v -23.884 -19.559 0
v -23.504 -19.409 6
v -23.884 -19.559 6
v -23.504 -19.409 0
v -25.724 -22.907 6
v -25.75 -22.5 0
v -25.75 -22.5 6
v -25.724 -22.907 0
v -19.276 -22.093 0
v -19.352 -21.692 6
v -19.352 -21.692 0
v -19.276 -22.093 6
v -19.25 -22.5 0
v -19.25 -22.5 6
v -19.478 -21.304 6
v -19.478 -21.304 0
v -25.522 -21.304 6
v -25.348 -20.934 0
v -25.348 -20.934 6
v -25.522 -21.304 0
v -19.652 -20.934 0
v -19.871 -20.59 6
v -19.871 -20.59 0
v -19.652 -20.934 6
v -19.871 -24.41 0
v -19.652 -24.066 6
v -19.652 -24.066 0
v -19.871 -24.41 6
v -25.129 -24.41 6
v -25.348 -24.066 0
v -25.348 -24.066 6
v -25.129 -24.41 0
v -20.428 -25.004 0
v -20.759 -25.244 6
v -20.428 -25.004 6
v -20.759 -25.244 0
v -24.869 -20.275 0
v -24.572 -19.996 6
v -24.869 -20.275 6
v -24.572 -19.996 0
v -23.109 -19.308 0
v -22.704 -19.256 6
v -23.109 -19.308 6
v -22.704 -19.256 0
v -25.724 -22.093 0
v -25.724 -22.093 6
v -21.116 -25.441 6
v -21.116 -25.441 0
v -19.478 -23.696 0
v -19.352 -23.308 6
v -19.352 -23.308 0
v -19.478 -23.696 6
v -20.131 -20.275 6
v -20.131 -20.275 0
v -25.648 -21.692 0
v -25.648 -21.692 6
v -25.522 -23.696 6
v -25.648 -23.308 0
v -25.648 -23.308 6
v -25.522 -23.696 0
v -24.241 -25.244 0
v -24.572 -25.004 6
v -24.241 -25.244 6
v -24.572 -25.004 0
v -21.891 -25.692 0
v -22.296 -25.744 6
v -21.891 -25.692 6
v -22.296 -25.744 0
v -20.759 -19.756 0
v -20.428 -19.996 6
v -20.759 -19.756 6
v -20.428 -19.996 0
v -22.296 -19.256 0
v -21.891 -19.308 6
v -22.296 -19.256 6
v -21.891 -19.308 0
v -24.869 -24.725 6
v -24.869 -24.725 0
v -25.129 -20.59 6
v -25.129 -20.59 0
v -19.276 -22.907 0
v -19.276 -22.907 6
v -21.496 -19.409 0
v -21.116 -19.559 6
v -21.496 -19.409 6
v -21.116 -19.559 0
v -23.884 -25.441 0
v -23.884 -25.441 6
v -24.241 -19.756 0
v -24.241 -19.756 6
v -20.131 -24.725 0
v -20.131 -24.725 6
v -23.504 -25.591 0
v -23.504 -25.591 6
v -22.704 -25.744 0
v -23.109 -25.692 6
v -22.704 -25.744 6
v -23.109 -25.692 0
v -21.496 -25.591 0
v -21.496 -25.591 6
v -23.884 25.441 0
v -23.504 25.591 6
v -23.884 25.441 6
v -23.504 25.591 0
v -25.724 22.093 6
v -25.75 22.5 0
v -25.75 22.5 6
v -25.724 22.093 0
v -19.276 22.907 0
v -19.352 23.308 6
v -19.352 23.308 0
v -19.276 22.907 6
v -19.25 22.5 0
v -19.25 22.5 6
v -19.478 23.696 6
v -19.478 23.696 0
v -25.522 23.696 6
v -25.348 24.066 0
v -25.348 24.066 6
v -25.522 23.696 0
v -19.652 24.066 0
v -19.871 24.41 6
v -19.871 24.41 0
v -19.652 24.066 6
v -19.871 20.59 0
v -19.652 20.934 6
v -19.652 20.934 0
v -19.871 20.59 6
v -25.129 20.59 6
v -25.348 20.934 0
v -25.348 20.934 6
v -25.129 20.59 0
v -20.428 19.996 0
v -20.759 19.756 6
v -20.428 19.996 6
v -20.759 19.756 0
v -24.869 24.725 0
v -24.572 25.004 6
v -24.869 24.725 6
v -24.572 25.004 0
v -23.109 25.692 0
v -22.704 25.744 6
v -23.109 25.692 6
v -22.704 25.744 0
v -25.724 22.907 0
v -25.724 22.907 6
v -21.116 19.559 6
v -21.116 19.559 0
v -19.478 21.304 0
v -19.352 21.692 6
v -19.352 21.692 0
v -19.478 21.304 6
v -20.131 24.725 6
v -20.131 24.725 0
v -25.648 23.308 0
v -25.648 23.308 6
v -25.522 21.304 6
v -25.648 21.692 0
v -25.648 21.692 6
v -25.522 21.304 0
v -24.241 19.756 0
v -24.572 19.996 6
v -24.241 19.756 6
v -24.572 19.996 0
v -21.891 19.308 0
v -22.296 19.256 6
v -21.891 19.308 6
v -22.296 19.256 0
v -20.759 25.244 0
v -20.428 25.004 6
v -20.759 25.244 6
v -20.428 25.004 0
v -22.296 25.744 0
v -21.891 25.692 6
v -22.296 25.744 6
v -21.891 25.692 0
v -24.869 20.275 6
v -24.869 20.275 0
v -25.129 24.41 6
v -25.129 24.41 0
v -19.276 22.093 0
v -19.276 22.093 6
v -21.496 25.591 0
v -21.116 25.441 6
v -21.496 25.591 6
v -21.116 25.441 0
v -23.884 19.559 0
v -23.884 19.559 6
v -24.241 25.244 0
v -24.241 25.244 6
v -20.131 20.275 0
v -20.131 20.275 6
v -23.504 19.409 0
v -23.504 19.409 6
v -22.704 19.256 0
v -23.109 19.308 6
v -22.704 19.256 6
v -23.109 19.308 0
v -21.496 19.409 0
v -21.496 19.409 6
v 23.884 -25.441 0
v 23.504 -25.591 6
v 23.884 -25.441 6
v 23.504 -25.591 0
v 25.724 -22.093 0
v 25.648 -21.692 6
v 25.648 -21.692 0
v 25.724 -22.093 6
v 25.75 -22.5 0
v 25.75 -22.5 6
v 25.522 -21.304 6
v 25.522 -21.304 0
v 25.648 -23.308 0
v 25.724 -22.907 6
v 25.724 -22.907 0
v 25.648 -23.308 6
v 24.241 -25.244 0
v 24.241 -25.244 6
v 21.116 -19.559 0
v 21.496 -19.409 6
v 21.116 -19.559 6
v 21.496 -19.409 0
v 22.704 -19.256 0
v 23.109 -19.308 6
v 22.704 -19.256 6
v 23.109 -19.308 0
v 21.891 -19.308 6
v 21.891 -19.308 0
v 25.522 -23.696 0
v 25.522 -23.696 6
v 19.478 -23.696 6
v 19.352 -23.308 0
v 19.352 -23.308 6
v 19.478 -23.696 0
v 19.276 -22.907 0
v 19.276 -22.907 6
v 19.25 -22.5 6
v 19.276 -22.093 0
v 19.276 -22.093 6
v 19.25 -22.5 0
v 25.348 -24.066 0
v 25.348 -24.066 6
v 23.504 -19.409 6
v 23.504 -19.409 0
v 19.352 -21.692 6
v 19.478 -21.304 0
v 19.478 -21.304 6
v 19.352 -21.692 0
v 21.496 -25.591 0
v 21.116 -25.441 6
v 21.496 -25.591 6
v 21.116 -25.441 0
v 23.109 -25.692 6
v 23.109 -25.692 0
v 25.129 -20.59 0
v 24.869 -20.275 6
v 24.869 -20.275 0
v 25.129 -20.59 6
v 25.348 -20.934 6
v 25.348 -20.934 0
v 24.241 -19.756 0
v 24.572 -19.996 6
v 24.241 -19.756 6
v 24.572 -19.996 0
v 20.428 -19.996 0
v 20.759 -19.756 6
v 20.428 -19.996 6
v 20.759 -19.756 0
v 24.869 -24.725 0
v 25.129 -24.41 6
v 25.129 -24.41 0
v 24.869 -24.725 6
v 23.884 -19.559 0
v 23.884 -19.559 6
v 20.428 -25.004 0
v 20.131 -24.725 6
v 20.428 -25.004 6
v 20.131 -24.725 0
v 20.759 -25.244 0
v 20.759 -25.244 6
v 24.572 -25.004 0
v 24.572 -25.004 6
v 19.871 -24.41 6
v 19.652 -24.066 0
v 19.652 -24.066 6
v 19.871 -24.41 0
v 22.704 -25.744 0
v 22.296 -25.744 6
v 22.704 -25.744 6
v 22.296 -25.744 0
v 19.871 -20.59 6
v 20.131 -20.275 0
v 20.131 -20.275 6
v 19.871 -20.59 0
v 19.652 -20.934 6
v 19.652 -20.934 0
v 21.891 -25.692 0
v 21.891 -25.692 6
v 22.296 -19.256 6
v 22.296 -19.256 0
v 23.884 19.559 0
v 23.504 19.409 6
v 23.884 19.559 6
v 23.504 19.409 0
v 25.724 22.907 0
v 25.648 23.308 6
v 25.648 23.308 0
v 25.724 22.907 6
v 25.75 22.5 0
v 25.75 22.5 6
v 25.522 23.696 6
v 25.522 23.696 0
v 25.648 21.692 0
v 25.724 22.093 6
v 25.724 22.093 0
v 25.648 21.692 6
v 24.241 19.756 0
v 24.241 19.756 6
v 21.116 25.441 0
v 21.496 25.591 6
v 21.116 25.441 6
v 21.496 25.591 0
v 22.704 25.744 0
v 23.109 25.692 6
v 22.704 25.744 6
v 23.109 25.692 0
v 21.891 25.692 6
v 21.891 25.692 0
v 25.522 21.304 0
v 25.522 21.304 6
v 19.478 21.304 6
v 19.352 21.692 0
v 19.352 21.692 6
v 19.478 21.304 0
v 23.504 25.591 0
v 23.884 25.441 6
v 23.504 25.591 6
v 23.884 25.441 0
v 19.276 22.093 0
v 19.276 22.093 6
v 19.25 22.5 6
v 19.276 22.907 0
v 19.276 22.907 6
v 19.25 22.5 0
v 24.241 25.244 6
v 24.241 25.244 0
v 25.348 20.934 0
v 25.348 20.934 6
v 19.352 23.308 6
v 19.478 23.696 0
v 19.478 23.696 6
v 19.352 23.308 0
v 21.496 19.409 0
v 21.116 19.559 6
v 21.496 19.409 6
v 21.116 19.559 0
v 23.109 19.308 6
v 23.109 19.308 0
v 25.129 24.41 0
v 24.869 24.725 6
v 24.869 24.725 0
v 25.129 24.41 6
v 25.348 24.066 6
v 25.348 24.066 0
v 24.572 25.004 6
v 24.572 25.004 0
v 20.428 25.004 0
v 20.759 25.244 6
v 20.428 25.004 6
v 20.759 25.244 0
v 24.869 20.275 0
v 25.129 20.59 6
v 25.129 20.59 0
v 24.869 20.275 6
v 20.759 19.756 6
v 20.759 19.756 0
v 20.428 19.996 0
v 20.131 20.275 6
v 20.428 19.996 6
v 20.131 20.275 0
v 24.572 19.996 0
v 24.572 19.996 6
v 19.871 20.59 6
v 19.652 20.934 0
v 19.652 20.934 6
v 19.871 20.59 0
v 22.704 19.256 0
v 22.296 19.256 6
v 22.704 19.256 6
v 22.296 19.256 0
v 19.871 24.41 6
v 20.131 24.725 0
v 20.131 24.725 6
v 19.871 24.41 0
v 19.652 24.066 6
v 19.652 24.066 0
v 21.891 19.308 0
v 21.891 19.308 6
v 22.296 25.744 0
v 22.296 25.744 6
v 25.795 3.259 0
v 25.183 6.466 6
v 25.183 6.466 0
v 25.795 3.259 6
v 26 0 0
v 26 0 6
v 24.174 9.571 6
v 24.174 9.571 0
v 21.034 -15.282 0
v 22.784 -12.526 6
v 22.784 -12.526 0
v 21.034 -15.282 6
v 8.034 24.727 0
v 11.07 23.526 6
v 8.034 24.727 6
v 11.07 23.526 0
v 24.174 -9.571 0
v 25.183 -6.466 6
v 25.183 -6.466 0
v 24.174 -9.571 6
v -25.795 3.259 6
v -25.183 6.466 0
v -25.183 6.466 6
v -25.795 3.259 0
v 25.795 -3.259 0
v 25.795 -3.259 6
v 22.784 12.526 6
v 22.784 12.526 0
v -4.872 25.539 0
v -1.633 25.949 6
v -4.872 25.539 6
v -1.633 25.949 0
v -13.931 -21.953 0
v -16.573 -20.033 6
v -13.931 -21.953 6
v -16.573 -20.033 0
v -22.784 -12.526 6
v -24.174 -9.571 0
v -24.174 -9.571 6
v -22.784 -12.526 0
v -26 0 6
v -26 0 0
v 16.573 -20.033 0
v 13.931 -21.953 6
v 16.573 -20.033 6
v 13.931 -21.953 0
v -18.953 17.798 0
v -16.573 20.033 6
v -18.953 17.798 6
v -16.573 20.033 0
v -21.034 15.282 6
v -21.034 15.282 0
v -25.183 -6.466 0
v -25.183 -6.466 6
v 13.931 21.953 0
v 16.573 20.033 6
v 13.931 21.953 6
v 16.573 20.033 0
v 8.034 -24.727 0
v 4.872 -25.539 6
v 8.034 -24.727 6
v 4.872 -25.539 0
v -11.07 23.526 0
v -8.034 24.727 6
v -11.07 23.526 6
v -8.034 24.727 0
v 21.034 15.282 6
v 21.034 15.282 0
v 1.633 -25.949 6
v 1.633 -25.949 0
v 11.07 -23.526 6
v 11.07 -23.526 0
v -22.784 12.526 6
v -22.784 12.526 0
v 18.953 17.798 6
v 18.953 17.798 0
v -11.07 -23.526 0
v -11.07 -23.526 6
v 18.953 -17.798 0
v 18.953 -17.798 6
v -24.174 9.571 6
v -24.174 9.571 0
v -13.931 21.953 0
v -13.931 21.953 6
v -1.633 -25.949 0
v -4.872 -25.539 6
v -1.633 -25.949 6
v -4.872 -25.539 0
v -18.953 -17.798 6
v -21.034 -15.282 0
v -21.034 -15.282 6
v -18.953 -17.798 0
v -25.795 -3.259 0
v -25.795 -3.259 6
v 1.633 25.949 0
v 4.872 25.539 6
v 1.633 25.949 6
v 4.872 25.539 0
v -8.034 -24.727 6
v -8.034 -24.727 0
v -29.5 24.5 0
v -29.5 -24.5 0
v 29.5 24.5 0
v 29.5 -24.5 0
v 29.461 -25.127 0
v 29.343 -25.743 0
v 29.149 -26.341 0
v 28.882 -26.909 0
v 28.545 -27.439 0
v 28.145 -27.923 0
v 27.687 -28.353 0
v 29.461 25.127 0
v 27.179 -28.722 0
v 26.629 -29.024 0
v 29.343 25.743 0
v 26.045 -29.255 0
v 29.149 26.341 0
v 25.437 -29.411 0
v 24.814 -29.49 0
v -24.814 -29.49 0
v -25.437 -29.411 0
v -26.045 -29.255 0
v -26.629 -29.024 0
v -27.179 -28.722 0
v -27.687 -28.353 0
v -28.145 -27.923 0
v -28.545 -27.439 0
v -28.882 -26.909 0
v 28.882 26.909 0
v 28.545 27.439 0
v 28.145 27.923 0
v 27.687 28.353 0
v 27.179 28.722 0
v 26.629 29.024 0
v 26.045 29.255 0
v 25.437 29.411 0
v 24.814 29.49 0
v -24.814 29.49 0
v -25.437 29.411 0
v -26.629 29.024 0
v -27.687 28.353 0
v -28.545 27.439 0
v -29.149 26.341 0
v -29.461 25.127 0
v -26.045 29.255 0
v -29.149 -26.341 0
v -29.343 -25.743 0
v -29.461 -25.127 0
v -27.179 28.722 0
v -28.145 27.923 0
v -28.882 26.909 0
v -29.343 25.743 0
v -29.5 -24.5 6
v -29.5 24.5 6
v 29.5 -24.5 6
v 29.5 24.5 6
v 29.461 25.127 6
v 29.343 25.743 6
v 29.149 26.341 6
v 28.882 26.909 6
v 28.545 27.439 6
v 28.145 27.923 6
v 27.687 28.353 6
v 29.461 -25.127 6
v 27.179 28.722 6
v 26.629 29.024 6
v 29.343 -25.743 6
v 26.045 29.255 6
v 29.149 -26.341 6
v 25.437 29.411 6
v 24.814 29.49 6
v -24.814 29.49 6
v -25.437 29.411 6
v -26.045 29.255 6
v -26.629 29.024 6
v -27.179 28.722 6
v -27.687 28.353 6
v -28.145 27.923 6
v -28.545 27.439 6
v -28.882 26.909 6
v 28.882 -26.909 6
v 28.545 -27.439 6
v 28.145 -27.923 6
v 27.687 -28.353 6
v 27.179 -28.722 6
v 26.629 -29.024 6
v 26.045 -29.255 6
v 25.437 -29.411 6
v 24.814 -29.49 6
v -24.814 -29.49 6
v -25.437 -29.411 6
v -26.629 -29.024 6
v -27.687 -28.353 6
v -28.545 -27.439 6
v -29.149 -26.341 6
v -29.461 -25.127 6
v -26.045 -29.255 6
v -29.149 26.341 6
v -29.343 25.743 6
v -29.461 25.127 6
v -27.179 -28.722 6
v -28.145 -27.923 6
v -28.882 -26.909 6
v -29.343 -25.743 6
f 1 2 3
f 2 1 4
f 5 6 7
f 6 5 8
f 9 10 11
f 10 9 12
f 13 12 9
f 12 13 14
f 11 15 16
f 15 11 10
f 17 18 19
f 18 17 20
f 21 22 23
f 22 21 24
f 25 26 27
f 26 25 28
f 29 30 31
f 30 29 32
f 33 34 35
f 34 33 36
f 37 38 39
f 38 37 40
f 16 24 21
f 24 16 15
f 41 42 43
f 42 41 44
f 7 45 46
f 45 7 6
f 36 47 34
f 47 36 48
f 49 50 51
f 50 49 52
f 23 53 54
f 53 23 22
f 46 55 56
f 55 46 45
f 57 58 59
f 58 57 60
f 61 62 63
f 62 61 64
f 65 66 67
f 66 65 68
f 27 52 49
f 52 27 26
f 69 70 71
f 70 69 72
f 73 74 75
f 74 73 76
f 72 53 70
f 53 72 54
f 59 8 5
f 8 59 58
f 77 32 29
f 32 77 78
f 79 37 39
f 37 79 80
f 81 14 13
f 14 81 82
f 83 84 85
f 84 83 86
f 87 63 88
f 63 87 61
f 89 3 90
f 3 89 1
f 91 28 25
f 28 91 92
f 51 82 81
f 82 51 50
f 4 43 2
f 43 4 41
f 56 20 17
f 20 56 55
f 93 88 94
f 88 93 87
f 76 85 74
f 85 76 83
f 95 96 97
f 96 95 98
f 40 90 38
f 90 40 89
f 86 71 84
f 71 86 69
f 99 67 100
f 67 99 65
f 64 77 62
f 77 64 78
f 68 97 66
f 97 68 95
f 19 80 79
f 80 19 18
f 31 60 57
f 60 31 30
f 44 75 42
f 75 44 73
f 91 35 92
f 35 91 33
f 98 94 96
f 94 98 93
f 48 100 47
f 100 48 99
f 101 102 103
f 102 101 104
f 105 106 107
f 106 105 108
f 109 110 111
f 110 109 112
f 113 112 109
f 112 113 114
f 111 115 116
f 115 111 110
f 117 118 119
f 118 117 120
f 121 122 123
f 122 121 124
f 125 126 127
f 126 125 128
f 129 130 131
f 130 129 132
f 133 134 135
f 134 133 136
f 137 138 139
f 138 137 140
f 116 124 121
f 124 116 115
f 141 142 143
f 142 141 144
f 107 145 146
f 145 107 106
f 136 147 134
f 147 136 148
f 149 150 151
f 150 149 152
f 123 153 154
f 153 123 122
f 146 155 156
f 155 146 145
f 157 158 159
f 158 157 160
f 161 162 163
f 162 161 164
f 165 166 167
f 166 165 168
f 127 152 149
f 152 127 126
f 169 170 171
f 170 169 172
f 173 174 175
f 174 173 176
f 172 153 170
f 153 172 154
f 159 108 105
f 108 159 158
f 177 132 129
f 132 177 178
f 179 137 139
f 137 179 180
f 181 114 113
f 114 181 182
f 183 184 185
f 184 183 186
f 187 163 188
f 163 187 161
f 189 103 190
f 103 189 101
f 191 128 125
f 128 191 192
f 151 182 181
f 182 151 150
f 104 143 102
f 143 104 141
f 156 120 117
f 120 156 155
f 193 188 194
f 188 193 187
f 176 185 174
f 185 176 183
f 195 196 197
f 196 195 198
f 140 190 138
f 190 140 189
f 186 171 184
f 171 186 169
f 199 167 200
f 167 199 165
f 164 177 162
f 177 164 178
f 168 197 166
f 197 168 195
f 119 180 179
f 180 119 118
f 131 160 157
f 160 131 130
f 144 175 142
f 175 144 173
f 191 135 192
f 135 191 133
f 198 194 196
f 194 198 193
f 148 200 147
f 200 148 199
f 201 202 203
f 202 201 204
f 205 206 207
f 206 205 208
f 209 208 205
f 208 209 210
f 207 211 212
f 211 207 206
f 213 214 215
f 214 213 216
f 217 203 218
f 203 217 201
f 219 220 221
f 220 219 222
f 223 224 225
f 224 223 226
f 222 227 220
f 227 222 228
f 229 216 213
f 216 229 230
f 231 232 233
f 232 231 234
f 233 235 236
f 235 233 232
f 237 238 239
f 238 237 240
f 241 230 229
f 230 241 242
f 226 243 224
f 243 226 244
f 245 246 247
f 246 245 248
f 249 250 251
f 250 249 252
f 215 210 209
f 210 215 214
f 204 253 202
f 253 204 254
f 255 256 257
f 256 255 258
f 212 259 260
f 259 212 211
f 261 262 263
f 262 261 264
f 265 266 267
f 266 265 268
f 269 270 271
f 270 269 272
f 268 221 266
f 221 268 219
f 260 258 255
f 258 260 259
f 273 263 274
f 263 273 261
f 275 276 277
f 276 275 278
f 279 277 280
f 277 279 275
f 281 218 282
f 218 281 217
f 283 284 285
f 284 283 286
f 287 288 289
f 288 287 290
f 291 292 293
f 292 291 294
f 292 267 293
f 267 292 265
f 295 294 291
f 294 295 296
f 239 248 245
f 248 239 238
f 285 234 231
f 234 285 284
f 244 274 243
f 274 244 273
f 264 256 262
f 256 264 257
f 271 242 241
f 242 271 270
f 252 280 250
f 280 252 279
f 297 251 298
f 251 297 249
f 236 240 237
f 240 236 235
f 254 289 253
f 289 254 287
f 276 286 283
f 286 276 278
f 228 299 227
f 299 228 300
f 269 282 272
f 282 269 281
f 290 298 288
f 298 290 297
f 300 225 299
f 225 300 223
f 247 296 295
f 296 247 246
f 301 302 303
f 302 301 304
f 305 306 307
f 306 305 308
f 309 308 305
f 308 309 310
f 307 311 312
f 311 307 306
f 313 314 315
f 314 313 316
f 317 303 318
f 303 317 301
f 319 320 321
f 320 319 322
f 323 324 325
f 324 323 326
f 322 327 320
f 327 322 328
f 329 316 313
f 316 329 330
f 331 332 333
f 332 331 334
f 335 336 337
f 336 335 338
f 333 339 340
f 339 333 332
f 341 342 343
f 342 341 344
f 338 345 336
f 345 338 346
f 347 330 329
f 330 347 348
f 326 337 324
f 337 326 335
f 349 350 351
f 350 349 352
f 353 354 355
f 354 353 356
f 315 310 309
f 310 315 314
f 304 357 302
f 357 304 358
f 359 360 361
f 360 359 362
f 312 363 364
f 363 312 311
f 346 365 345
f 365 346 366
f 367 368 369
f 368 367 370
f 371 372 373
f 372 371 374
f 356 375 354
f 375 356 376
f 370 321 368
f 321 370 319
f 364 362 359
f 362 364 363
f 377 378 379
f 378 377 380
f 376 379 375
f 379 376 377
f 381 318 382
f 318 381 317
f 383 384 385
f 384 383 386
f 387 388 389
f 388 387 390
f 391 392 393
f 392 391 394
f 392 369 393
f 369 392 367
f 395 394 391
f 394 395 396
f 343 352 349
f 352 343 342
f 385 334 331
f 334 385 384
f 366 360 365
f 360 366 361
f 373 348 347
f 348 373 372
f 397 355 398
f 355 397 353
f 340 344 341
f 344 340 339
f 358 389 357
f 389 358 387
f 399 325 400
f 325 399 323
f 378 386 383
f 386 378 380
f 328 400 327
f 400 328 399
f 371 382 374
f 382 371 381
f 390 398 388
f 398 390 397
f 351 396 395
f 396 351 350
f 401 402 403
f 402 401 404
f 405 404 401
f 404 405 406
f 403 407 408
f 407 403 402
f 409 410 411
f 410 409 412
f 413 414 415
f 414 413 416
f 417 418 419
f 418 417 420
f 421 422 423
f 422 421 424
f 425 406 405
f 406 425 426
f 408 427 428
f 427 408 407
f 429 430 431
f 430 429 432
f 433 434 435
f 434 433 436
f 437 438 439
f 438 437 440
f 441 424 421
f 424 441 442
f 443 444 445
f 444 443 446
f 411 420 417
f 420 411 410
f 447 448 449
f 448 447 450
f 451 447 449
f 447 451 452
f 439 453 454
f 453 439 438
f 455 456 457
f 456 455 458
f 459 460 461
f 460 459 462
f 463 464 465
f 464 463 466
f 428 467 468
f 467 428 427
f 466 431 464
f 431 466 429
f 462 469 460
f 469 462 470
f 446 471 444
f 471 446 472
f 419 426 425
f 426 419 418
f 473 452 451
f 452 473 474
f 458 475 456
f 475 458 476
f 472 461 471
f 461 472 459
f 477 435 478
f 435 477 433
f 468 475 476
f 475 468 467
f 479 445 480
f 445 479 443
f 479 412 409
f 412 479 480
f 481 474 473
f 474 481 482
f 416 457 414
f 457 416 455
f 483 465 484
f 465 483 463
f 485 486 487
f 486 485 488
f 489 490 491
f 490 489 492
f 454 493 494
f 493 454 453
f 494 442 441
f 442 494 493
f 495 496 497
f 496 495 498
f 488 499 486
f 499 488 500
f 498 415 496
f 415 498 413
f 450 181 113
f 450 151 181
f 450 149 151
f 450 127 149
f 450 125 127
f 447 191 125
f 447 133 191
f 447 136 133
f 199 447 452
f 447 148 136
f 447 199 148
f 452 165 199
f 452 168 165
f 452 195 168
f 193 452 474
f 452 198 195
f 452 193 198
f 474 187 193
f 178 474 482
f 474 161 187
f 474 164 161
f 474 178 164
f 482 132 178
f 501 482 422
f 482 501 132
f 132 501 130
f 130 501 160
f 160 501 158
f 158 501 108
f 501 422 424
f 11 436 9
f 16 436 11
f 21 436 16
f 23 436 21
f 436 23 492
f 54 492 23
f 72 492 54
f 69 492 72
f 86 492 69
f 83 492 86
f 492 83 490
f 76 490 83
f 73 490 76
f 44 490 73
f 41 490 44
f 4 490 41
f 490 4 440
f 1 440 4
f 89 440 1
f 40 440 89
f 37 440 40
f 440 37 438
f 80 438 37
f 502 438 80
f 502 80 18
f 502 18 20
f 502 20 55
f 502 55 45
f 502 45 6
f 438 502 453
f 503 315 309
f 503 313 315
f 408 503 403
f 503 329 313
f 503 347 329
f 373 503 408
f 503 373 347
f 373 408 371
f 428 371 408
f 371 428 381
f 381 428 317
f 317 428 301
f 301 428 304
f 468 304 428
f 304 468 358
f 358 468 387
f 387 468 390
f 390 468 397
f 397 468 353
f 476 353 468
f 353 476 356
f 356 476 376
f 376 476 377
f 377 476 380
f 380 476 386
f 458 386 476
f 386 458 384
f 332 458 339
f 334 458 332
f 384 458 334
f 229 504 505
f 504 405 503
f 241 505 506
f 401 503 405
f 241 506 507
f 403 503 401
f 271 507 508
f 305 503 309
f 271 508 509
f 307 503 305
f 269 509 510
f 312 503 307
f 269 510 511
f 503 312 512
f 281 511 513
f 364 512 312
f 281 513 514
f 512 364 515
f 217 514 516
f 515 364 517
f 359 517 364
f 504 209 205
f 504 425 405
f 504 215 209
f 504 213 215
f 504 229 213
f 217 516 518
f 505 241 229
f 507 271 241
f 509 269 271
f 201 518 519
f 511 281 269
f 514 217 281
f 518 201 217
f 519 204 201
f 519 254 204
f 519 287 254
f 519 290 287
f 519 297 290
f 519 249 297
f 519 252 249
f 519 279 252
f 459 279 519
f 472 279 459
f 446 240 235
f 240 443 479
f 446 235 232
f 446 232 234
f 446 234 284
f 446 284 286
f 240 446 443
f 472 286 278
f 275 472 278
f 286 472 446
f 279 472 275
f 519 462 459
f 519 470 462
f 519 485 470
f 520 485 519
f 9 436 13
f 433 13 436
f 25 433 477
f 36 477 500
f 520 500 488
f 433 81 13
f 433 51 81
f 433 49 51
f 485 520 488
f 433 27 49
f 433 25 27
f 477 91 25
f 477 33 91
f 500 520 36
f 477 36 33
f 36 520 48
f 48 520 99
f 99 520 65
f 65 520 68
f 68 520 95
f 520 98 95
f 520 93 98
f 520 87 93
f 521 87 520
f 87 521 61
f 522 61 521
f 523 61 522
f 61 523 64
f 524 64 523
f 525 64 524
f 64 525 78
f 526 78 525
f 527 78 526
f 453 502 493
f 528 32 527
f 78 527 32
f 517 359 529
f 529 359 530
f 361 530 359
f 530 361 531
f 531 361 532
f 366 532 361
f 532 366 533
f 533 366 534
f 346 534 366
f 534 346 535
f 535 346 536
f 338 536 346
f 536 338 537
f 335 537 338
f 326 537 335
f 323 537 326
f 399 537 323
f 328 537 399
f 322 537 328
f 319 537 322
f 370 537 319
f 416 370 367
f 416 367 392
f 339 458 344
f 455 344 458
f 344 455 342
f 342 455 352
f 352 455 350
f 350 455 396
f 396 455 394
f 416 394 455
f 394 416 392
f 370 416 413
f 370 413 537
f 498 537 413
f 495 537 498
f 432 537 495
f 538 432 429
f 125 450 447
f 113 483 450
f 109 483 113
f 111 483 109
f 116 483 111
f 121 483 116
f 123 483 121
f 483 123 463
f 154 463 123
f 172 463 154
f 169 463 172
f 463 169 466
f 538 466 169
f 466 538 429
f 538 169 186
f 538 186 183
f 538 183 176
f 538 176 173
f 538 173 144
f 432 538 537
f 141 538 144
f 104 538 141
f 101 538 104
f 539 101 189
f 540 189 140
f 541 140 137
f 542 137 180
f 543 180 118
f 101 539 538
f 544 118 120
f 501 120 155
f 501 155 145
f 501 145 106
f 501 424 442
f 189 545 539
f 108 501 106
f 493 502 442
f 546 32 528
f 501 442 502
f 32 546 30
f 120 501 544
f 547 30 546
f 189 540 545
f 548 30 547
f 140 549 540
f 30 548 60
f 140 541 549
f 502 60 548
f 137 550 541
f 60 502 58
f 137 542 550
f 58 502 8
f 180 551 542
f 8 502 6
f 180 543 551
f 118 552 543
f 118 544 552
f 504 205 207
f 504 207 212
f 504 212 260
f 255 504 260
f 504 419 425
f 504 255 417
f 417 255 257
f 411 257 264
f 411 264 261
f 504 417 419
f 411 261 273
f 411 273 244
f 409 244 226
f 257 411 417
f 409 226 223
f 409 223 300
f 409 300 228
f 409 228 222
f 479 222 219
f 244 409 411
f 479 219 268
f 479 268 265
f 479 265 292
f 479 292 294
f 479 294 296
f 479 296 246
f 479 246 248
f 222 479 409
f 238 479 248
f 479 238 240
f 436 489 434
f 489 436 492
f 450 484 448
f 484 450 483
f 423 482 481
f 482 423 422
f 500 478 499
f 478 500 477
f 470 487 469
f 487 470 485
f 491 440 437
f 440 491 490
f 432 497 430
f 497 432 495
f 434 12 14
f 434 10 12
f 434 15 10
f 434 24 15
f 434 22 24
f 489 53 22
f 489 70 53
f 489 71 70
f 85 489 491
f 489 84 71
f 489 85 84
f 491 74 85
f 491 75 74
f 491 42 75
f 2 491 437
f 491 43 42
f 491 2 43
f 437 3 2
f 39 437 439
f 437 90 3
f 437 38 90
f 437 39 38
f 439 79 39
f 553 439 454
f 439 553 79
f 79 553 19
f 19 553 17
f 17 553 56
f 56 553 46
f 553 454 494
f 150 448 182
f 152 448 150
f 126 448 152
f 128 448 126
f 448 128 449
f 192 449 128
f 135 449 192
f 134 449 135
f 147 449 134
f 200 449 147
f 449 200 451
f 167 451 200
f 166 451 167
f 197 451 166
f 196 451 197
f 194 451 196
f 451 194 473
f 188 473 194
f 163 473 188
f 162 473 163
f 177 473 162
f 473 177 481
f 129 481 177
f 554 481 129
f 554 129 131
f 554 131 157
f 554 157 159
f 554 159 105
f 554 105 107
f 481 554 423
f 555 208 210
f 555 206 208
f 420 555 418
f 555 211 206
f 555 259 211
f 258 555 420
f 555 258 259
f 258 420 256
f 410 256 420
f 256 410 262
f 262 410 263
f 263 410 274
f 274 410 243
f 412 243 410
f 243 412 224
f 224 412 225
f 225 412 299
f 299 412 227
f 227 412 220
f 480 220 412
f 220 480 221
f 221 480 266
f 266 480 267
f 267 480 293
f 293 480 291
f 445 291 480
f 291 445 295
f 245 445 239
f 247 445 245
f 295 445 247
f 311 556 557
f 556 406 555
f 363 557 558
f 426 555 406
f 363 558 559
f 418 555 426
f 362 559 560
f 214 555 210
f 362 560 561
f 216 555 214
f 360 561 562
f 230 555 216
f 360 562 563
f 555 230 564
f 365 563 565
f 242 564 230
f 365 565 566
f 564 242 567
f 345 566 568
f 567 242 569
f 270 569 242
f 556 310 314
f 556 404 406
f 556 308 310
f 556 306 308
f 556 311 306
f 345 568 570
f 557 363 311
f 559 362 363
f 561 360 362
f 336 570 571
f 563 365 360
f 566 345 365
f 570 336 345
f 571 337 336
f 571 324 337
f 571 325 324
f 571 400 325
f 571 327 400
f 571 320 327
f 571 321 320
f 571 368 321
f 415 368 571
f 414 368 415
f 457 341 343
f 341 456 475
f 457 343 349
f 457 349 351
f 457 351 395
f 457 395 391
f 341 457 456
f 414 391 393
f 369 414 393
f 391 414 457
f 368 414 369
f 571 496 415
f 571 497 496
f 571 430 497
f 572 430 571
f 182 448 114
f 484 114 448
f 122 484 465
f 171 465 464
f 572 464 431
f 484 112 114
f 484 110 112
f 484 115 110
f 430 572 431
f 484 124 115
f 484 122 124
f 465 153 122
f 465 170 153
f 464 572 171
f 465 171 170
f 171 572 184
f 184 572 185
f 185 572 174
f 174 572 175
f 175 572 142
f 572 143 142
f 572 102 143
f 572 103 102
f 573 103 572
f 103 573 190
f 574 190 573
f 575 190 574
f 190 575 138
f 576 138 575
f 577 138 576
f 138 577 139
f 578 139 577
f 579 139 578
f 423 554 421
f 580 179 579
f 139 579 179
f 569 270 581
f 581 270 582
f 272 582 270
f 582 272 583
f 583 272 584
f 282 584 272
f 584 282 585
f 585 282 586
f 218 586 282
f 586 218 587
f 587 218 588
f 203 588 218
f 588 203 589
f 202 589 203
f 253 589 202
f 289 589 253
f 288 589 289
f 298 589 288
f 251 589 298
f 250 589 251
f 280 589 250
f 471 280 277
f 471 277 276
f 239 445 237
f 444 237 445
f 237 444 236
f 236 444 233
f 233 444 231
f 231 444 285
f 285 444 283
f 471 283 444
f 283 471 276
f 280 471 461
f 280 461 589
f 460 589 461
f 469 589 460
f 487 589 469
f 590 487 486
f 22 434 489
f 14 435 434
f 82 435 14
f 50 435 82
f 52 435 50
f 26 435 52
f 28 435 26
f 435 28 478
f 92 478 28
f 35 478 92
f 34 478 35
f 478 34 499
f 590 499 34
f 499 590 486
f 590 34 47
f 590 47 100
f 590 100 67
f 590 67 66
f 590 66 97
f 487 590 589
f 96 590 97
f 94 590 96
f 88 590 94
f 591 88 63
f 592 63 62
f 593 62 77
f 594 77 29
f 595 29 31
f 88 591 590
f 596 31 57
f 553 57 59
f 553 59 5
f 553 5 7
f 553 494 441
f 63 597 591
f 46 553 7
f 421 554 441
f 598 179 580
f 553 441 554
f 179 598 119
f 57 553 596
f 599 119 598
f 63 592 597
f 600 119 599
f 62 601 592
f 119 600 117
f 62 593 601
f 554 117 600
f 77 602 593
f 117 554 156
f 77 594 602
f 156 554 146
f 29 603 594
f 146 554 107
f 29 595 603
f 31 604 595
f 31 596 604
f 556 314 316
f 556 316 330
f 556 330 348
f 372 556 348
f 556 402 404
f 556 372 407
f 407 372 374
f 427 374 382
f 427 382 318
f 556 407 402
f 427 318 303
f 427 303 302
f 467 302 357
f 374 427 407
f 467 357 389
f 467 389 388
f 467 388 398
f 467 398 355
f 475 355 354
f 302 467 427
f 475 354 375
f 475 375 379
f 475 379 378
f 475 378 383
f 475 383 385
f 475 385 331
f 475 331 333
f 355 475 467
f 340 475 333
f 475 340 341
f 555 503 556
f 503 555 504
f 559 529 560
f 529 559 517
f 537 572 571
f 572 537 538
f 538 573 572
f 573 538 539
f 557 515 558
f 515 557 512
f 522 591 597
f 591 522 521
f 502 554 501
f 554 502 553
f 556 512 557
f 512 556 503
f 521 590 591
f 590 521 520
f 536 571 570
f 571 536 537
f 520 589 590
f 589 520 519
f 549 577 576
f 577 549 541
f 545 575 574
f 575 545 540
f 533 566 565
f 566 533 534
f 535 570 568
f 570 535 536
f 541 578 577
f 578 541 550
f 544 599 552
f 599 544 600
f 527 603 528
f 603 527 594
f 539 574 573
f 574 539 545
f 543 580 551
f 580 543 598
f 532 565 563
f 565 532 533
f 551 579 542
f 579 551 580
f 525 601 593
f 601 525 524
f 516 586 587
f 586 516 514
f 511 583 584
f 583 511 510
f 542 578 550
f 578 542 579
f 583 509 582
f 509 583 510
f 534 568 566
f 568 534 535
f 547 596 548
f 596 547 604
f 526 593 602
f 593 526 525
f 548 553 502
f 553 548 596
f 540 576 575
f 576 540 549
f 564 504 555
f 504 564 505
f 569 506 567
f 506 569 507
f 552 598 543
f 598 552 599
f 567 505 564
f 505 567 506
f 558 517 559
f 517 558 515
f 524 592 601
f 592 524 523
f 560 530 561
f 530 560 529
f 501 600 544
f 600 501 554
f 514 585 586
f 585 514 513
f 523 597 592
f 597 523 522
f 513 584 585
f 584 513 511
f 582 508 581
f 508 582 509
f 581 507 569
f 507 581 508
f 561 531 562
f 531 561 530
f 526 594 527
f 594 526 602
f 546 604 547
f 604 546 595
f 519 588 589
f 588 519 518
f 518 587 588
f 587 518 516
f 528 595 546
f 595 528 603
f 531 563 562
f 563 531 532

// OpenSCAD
$fn = 50;

difference() {
	union() {
		hull() {
			translate(v = [-24.5, 24.5, 0]) {
				cylinder(h = 6, r = 5);
			}
			translate(v = [24.5, 24.5, 0]) {
				cylinder(h = 6, r = 5);
			}
			translate(v = [-24.5, -24.5, 0]) {
				cylinder(h = 6, r = 5);
			}
			translate(v = [24.5, -24.5, 0]) {
				cylinder(h = 6, r = 5);
			}
		}
	}
	union() {
		translate(v = [-22.5, -22.5, -100.0]) {
			cylinder(h = 200, r = 3.25);
		}
		translate(v = [-22.5, 22.5, -100.0]) {
			cylinder(h = 200, r = 3.25);
		}
		translate(v = [22.5, -22.5, -100.0]) {
			cylinder(h = 200, r = 3.25);
		}
		translate(v = [22.5, 22.5, -100.0]) {
			cylinder(h = 200, r = 3.25);
		}
		translate(v = [-22.5, -22.5, -100.0]) {
			cylinder(h = 200, r = 1.8);
		}
		translate(v = [-22.5, 22.5, -100.0]) {
			cylinder(h = 200, r = 1.8);
		}
		translate(v = [22.5, -22.5, -100.0]) {
			cylinder(h = 200, r = 1.8);
		}
		translate(v = [22.5, 22.5, -100.0]) {
			cylinder(h = 200, r = 1.8);
		}
		cylinder(h = 6, r = 26.0);
	}
}
